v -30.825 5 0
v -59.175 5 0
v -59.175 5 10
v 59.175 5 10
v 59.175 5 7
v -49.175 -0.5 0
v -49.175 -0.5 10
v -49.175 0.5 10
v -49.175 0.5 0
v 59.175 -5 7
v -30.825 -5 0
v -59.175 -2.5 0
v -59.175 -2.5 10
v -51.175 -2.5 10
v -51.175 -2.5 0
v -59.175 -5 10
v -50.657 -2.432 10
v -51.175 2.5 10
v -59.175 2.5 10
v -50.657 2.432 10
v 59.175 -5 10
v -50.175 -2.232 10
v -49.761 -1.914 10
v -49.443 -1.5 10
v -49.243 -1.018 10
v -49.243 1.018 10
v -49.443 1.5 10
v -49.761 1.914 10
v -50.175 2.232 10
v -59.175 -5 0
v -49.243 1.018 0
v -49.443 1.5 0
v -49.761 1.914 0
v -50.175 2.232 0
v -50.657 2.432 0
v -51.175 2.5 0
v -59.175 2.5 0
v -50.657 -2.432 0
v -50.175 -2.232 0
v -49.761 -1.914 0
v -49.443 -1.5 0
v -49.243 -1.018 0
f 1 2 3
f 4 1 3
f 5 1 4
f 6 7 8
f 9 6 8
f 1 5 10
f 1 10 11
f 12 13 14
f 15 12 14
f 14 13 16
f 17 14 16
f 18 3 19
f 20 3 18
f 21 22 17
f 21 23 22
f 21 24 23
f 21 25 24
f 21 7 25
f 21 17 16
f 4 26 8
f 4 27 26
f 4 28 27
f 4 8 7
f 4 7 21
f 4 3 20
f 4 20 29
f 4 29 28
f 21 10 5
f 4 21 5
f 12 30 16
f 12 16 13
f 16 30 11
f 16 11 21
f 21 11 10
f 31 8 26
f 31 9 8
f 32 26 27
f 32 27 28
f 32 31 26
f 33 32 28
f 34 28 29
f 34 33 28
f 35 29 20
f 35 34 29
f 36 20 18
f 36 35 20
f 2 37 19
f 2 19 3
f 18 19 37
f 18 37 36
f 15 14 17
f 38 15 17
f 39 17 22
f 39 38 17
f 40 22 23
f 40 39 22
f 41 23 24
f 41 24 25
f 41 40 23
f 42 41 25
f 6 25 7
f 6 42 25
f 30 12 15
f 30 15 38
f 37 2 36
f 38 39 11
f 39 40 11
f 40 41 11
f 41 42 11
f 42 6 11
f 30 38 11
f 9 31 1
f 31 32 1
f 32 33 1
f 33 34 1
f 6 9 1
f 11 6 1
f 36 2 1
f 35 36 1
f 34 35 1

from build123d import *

# Parameters (mm, degrees)
CROQUIS1_W              = 118.35
CROQUIS1_H              = 10
SALIENTE_EXTRUIR1_DEPTH = 10
CROQUIS2_W              = 20
CROQUIS2_H              = 5
CORTAR_EXTRUIR1_DEPTH   = 11
CORTAR_EXTRUIR2_DEPTH   = 11
REDONDEO1_R             = 2


with BuildPart() as part:
    # Croquis1 → Saliente-Extruir1 (new body)
    with BuildSketch(Plane.XY):
        Rectangle(CROQUIS1_W, CROQUIS1_H)
    extrude(amount=SALIENTE_EXTRUIR1_DEPTH)

    # Croquis2 → Cortar-Extruir1 (cut, through all)
    with BuildSketch(Plane.XY.offset(10)):
        with Locations((-59.175, 0)):
            Rectangle(CROQUIS2_W, CROQUIS2_H)
    extrude(amount=-CORTAR_EXTRUIR1_DEPTH, mode=Mode.SUBTRACT)

    # Croquis3 → Cortar-Extruir2 (cut, through all)
    with BuildSketch(Plane(origin=(0, 5, 0), x_dir=(1, 0, 0), z_dir=(0, 1, 0))):
        Polygon((59.175, -7), (-30.825, 0), (59.175, 0), align=None)
    extrude(amount=-CORTAR_EXTRUIR2_DEPTH, mode=Mode.SUBTRACT)

    # Redondeo1
    redondeo1_edges = [part.edges().sort_by_distance(p)[0] for p in [
        (-49.175, -2.5, 5),
        (-49.175, 2.5, 5),
    ]]
    fillet(redondeo1_edges, radius=REDONDEO1_R)


solid = part.part
